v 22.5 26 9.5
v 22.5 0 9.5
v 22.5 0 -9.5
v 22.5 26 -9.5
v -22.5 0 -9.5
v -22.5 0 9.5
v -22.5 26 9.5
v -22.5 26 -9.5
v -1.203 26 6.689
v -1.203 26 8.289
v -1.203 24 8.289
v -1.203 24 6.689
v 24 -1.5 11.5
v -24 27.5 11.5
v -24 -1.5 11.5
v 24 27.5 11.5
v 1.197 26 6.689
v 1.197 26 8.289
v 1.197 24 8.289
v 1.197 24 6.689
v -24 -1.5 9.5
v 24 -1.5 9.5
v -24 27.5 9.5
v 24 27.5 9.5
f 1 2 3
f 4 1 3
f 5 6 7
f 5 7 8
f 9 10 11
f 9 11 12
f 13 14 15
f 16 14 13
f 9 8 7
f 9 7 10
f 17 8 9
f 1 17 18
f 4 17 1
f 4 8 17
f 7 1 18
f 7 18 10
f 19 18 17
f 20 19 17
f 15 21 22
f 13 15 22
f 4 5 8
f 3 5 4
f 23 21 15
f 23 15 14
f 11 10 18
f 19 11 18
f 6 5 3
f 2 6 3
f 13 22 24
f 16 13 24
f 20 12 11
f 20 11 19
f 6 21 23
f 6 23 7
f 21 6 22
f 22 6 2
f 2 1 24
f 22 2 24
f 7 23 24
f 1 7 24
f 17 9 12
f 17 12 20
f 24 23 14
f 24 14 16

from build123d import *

# Parameters (mm, degrees)
SKETCH1_W           = 45
SKETCH1_H           = 19
BOSS_EXTRUDE1_DEPTH = 26
SKETCH2_W           = 48
SKETCH2_H           = 29
BOSS_EXTRUDE2_DEPTH = 2
SKETCH3_W           = 2.4
SKETCH3_H           = 1.6
CUT_EXTRUDE1_DEPTH  = 2


with BuildPart() as part:
    # Sketch1 → Boss-Extrude1 (new body)
    with BuildSketch(Plane(origin=(0, 0, 0), x_dir=(1, 0, 0), z_dir=(0, 1, 0))):
        Rectangle(SKETCH1_W, SKETCH1_H)
    extrude(amount=BOSS_EXTRUDE1_DEPTH)

    # Sketch2 → Boss-Extrude2 (add)
    with BuildSketch(Plane.XY.offset(9.5)):
        with Locations((0, 13)):
            Rectangle(SKETCH2_W, SKETCH2_H)
    extrude(amount=BOSS_EXTRUDE2_DEPTH)

    # Sketch3 → Cut-Extrude1 (cut)
    with BuildSketch(Plane(origin=(0, 26, 0), x_dir=(1, 0, 0), z_dir=(0, 1, 0))):
        with Locations((-0.003209451, -7.489007977)):
            Rectangle(SKETCH3_W, SKETCH3_H)
    extrude(amount=-CUT_EXTRUDE1_DEPTH, mode=Mode.SUBTRACT)


solid = part.part
